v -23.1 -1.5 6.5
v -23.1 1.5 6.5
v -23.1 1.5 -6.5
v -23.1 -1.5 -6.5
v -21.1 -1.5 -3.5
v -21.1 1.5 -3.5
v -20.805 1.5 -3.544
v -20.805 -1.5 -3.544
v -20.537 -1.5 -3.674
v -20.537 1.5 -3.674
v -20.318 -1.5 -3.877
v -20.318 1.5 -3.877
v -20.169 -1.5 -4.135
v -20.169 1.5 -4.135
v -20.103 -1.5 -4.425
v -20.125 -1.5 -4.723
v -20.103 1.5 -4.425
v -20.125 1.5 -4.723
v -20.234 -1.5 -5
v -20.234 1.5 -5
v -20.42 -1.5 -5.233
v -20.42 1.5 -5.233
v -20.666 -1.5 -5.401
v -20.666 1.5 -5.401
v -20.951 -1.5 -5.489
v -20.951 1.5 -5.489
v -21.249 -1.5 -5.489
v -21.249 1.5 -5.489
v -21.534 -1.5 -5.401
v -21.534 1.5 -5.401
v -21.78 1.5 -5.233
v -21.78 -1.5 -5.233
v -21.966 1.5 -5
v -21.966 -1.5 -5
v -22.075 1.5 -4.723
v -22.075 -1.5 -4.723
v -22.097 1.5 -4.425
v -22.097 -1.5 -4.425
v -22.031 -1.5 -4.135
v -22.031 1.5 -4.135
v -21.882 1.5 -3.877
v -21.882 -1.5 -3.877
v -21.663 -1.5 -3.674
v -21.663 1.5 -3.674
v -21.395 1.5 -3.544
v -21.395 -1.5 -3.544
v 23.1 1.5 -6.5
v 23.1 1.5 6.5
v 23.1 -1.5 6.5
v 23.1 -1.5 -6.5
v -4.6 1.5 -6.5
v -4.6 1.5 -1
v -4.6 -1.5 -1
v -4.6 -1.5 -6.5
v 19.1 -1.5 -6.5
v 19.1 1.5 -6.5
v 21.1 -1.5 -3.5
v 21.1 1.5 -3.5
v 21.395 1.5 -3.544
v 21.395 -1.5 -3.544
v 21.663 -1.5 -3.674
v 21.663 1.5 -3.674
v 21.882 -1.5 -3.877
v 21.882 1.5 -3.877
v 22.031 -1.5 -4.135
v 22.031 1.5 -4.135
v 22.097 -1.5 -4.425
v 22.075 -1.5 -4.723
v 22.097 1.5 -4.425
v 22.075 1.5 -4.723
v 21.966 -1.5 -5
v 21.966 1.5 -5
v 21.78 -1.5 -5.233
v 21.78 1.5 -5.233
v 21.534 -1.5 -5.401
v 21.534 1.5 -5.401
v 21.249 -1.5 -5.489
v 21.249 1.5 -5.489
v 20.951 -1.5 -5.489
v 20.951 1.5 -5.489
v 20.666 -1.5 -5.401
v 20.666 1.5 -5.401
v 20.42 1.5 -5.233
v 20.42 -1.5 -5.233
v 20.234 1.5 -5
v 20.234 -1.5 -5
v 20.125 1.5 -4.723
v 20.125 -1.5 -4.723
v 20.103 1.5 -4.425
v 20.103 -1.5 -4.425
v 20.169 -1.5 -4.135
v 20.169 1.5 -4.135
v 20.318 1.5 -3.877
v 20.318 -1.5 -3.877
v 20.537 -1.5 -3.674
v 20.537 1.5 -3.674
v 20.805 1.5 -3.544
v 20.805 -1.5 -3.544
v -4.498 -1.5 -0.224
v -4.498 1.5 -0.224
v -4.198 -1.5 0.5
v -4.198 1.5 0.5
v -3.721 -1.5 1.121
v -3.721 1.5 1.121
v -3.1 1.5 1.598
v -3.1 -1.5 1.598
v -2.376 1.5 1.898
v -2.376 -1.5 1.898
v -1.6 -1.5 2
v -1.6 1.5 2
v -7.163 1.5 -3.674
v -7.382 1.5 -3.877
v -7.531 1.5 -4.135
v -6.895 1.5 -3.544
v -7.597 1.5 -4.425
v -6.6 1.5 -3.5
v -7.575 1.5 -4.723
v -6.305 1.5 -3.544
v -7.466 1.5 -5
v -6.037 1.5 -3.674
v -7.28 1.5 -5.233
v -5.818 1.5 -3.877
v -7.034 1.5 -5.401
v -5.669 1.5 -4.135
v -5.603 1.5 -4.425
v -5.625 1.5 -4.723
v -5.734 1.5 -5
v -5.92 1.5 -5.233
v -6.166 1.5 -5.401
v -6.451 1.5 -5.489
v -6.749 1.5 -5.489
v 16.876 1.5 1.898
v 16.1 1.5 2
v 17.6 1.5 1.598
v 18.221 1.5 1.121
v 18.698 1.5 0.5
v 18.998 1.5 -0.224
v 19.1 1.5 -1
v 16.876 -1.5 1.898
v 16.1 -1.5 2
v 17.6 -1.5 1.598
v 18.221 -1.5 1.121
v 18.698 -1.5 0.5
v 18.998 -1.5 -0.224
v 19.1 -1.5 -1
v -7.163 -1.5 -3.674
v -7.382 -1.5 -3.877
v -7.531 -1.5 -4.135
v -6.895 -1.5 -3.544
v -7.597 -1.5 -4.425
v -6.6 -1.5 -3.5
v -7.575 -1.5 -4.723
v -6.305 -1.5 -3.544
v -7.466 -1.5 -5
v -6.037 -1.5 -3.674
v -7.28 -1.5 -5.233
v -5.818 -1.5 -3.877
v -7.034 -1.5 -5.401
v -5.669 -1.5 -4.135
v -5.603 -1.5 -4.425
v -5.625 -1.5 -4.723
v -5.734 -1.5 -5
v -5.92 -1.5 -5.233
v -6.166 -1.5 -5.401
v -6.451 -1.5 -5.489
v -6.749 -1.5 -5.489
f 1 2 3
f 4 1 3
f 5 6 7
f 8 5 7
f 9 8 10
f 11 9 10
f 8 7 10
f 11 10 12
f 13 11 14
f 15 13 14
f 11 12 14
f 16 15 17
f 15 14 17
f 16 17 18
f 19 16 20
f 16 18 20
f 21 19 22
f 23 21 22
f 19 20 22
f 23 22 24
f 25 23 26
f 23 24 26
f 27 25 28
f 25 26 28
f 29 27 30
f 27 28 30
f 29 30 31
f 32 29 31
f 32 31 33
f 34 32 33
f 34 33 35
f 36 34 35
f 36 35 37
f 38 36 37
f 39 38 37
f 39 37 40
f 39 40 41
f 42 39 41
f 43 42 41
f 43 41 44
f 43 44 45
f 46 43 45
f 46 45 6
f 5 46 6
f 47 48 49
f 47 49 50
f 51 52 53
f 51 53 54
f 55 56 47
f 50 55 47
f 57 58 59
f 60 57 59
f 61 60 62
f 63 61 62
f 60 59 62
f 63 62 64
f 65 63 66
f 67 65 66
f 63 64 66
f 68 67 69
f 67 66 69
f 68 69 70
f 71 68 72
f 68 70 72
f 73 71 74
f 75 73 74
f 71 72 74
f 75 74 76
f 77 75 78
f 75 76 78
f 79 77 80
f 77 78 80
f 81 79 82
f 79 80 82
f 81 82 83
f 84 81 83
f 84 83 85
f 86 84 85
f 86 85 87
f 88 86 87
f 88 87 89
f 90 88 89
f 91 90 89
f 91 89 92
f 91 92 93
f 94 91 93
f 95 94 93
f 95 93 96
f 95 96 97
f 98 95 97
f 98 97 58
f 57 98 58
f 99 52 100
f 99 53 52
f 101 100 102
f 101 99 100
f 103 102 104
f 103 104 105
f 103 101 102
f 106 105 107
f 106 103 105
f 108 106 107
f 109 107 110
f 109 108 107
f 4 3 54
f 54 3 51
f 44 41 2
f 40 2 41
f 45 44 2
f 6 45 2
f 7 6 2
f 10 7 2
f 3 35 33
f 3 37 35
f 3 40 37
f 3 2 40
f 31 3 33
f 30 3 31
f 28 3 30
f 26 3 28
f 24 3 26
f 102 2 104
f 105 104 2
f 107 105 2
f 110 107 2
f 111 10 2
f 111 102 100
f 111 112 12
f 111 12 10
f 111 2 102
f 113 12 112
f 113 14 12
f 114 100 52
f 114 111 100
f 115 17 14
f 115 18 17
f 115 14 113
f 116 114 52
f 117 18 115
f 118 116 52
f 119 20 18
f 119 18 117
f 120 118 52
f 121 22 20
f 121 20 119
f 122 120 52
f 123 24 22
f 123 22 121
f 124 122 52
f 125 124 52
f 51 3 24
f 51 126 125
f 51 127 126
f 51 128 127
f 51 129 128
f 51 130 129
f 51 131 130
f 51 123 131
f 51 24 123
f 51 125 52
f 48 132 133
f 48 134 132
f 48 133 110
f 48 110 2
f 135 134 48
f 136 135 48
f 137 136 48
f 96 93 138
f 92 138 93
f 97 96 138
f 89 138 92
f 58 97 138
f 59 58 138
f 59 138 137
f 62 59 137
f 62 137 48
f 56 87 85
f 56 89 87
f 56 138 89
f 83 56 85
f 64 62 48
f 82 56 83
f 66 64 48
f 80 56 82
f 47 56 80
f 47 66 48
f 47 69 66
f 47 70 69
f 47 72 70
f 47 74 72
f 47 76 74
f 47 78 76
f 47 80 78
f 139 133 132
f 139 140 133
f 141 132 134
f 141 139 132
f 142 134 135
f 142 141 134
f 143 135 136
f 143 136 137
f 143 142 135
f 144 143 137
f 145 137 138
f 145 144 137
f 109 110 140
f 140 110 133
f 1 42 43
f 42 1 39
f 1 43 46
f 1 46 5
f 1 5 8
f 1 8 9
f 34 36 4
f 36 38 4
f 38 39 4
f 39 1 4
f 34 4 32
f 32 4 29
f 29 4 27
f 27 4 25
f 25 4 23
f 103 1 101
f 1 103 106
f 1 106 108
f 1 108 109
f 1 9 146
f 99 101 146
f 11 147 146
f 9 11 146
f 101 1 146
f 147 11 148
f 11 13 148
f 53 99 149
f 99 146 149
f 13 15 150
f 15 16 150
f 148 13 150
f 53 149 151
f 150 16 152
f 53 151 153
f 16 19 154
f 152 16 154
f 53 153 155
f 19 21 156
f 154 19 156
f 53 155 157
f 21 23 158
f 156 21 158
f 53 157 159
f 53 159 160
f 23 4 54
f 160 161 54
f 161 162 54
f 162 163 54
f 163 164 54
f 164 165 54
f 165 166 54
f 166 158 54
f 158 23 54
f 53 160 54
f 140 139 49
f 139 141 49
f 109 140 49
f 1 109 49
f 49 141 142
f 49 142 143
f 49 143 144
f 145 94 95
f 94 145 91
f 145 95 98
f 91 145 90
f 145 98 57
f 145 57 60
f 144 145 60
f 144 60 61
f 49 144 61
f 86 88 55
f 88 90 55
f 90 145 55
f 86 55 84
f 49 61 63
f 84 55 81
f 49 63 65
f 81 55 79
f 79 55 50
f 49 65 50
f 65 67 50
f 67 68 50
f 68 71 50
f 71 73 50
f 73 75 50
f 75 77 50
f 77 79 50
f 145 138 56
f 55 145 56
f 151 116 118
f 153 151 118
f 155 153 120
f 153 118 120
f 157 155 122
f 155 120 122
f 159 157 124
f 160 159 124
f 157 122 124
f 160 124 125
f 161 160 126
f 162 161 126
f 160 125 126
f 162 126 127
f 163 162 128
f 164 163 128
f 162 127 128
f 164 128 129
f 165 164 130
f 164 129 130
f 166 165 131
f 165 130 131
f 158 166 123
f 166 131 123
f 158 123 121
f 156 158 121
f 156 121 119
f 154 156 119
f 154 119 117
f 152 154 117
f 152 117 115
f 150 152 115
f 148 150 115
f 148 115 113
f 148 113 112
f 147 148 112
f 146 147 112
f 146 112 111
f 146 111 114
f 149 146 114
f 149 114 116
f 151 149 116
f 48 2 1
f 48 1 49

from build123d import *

# Parameters (mm, degrees)
SKETCH1_W           = 46.2
SKETCH1_H           = 13
BOSS_EXTRUDE1_DEPTH = 1.5
SKETCH3_R           = 1
CUT_EXTRUDE1_DEPTH  = 25.183878928
SKETCH4_W           = 23.7
SKETCH4_H           = 8.5
CUT_EXTRUDE2_DEPTH  = 25.183878928
FILLET1_R           = 3


with BuildPart() as part:
    # Sketch1 → Boss-Extrude1 (new, symmetric)
    with BuildSketch(Plane(origin=(0, 0, 0), x_dir=(1, 0, 0), z_dir=(0, 1, 0))):
        Rectangle(SKETCH1_W, SKETCH1_H)
    extrude(amount=BOSS_EXTRUDE1_DEPTH, both=True)

    # Sketch3 → Cut-Extrude1 (cut, through all)
    with BuildSketch(Plane(origin=(0, 1.5, 0), x_dir=(1, 0, 0), z_dir=(0, 1, 0))):
        with Locations(Location((-21.1, 4.5, 0), (0, 0, 270))):
            Circle(SKETCH3_R)
        with Locations(Location((-6.6, 4.5, 0), (0, 0, 270))):
            Circle(SKETCH3_R)
        with Locations(Location((21.1, 4.5, 0), (0, 0, 270))):
            Circle(SKETCH3_R)
    extrude(amount=-CUT_EXTRUDE1_DEPTH, mode=Mode.SUBTRACT)

    # Sketch4 → Cut-Extrude2 (cut, through all)
    with BuildSketch(Plane(origin=(0, 1.5, 0), x_dir=(1, 0, 0), z_dir=(0, 1, 0))):
        with Locations((7.25, 2.25)):
            Rectangle(SKETCH4_W, SKETCH4_H)
    extrude(amount=-CUT_EXTRUDE2_DEPTH, mode=Mode.SUBTRACT)

    # Fillet1
    fillet1_edges = [part.edges().sort_by_distance(p)[0] for p in [
        (-4.6, 0, 2),
        (19.1, 0, 2),
    ]]
    fillet(fillet1_edges, radius=FILLET1_R)


solid = part.part
